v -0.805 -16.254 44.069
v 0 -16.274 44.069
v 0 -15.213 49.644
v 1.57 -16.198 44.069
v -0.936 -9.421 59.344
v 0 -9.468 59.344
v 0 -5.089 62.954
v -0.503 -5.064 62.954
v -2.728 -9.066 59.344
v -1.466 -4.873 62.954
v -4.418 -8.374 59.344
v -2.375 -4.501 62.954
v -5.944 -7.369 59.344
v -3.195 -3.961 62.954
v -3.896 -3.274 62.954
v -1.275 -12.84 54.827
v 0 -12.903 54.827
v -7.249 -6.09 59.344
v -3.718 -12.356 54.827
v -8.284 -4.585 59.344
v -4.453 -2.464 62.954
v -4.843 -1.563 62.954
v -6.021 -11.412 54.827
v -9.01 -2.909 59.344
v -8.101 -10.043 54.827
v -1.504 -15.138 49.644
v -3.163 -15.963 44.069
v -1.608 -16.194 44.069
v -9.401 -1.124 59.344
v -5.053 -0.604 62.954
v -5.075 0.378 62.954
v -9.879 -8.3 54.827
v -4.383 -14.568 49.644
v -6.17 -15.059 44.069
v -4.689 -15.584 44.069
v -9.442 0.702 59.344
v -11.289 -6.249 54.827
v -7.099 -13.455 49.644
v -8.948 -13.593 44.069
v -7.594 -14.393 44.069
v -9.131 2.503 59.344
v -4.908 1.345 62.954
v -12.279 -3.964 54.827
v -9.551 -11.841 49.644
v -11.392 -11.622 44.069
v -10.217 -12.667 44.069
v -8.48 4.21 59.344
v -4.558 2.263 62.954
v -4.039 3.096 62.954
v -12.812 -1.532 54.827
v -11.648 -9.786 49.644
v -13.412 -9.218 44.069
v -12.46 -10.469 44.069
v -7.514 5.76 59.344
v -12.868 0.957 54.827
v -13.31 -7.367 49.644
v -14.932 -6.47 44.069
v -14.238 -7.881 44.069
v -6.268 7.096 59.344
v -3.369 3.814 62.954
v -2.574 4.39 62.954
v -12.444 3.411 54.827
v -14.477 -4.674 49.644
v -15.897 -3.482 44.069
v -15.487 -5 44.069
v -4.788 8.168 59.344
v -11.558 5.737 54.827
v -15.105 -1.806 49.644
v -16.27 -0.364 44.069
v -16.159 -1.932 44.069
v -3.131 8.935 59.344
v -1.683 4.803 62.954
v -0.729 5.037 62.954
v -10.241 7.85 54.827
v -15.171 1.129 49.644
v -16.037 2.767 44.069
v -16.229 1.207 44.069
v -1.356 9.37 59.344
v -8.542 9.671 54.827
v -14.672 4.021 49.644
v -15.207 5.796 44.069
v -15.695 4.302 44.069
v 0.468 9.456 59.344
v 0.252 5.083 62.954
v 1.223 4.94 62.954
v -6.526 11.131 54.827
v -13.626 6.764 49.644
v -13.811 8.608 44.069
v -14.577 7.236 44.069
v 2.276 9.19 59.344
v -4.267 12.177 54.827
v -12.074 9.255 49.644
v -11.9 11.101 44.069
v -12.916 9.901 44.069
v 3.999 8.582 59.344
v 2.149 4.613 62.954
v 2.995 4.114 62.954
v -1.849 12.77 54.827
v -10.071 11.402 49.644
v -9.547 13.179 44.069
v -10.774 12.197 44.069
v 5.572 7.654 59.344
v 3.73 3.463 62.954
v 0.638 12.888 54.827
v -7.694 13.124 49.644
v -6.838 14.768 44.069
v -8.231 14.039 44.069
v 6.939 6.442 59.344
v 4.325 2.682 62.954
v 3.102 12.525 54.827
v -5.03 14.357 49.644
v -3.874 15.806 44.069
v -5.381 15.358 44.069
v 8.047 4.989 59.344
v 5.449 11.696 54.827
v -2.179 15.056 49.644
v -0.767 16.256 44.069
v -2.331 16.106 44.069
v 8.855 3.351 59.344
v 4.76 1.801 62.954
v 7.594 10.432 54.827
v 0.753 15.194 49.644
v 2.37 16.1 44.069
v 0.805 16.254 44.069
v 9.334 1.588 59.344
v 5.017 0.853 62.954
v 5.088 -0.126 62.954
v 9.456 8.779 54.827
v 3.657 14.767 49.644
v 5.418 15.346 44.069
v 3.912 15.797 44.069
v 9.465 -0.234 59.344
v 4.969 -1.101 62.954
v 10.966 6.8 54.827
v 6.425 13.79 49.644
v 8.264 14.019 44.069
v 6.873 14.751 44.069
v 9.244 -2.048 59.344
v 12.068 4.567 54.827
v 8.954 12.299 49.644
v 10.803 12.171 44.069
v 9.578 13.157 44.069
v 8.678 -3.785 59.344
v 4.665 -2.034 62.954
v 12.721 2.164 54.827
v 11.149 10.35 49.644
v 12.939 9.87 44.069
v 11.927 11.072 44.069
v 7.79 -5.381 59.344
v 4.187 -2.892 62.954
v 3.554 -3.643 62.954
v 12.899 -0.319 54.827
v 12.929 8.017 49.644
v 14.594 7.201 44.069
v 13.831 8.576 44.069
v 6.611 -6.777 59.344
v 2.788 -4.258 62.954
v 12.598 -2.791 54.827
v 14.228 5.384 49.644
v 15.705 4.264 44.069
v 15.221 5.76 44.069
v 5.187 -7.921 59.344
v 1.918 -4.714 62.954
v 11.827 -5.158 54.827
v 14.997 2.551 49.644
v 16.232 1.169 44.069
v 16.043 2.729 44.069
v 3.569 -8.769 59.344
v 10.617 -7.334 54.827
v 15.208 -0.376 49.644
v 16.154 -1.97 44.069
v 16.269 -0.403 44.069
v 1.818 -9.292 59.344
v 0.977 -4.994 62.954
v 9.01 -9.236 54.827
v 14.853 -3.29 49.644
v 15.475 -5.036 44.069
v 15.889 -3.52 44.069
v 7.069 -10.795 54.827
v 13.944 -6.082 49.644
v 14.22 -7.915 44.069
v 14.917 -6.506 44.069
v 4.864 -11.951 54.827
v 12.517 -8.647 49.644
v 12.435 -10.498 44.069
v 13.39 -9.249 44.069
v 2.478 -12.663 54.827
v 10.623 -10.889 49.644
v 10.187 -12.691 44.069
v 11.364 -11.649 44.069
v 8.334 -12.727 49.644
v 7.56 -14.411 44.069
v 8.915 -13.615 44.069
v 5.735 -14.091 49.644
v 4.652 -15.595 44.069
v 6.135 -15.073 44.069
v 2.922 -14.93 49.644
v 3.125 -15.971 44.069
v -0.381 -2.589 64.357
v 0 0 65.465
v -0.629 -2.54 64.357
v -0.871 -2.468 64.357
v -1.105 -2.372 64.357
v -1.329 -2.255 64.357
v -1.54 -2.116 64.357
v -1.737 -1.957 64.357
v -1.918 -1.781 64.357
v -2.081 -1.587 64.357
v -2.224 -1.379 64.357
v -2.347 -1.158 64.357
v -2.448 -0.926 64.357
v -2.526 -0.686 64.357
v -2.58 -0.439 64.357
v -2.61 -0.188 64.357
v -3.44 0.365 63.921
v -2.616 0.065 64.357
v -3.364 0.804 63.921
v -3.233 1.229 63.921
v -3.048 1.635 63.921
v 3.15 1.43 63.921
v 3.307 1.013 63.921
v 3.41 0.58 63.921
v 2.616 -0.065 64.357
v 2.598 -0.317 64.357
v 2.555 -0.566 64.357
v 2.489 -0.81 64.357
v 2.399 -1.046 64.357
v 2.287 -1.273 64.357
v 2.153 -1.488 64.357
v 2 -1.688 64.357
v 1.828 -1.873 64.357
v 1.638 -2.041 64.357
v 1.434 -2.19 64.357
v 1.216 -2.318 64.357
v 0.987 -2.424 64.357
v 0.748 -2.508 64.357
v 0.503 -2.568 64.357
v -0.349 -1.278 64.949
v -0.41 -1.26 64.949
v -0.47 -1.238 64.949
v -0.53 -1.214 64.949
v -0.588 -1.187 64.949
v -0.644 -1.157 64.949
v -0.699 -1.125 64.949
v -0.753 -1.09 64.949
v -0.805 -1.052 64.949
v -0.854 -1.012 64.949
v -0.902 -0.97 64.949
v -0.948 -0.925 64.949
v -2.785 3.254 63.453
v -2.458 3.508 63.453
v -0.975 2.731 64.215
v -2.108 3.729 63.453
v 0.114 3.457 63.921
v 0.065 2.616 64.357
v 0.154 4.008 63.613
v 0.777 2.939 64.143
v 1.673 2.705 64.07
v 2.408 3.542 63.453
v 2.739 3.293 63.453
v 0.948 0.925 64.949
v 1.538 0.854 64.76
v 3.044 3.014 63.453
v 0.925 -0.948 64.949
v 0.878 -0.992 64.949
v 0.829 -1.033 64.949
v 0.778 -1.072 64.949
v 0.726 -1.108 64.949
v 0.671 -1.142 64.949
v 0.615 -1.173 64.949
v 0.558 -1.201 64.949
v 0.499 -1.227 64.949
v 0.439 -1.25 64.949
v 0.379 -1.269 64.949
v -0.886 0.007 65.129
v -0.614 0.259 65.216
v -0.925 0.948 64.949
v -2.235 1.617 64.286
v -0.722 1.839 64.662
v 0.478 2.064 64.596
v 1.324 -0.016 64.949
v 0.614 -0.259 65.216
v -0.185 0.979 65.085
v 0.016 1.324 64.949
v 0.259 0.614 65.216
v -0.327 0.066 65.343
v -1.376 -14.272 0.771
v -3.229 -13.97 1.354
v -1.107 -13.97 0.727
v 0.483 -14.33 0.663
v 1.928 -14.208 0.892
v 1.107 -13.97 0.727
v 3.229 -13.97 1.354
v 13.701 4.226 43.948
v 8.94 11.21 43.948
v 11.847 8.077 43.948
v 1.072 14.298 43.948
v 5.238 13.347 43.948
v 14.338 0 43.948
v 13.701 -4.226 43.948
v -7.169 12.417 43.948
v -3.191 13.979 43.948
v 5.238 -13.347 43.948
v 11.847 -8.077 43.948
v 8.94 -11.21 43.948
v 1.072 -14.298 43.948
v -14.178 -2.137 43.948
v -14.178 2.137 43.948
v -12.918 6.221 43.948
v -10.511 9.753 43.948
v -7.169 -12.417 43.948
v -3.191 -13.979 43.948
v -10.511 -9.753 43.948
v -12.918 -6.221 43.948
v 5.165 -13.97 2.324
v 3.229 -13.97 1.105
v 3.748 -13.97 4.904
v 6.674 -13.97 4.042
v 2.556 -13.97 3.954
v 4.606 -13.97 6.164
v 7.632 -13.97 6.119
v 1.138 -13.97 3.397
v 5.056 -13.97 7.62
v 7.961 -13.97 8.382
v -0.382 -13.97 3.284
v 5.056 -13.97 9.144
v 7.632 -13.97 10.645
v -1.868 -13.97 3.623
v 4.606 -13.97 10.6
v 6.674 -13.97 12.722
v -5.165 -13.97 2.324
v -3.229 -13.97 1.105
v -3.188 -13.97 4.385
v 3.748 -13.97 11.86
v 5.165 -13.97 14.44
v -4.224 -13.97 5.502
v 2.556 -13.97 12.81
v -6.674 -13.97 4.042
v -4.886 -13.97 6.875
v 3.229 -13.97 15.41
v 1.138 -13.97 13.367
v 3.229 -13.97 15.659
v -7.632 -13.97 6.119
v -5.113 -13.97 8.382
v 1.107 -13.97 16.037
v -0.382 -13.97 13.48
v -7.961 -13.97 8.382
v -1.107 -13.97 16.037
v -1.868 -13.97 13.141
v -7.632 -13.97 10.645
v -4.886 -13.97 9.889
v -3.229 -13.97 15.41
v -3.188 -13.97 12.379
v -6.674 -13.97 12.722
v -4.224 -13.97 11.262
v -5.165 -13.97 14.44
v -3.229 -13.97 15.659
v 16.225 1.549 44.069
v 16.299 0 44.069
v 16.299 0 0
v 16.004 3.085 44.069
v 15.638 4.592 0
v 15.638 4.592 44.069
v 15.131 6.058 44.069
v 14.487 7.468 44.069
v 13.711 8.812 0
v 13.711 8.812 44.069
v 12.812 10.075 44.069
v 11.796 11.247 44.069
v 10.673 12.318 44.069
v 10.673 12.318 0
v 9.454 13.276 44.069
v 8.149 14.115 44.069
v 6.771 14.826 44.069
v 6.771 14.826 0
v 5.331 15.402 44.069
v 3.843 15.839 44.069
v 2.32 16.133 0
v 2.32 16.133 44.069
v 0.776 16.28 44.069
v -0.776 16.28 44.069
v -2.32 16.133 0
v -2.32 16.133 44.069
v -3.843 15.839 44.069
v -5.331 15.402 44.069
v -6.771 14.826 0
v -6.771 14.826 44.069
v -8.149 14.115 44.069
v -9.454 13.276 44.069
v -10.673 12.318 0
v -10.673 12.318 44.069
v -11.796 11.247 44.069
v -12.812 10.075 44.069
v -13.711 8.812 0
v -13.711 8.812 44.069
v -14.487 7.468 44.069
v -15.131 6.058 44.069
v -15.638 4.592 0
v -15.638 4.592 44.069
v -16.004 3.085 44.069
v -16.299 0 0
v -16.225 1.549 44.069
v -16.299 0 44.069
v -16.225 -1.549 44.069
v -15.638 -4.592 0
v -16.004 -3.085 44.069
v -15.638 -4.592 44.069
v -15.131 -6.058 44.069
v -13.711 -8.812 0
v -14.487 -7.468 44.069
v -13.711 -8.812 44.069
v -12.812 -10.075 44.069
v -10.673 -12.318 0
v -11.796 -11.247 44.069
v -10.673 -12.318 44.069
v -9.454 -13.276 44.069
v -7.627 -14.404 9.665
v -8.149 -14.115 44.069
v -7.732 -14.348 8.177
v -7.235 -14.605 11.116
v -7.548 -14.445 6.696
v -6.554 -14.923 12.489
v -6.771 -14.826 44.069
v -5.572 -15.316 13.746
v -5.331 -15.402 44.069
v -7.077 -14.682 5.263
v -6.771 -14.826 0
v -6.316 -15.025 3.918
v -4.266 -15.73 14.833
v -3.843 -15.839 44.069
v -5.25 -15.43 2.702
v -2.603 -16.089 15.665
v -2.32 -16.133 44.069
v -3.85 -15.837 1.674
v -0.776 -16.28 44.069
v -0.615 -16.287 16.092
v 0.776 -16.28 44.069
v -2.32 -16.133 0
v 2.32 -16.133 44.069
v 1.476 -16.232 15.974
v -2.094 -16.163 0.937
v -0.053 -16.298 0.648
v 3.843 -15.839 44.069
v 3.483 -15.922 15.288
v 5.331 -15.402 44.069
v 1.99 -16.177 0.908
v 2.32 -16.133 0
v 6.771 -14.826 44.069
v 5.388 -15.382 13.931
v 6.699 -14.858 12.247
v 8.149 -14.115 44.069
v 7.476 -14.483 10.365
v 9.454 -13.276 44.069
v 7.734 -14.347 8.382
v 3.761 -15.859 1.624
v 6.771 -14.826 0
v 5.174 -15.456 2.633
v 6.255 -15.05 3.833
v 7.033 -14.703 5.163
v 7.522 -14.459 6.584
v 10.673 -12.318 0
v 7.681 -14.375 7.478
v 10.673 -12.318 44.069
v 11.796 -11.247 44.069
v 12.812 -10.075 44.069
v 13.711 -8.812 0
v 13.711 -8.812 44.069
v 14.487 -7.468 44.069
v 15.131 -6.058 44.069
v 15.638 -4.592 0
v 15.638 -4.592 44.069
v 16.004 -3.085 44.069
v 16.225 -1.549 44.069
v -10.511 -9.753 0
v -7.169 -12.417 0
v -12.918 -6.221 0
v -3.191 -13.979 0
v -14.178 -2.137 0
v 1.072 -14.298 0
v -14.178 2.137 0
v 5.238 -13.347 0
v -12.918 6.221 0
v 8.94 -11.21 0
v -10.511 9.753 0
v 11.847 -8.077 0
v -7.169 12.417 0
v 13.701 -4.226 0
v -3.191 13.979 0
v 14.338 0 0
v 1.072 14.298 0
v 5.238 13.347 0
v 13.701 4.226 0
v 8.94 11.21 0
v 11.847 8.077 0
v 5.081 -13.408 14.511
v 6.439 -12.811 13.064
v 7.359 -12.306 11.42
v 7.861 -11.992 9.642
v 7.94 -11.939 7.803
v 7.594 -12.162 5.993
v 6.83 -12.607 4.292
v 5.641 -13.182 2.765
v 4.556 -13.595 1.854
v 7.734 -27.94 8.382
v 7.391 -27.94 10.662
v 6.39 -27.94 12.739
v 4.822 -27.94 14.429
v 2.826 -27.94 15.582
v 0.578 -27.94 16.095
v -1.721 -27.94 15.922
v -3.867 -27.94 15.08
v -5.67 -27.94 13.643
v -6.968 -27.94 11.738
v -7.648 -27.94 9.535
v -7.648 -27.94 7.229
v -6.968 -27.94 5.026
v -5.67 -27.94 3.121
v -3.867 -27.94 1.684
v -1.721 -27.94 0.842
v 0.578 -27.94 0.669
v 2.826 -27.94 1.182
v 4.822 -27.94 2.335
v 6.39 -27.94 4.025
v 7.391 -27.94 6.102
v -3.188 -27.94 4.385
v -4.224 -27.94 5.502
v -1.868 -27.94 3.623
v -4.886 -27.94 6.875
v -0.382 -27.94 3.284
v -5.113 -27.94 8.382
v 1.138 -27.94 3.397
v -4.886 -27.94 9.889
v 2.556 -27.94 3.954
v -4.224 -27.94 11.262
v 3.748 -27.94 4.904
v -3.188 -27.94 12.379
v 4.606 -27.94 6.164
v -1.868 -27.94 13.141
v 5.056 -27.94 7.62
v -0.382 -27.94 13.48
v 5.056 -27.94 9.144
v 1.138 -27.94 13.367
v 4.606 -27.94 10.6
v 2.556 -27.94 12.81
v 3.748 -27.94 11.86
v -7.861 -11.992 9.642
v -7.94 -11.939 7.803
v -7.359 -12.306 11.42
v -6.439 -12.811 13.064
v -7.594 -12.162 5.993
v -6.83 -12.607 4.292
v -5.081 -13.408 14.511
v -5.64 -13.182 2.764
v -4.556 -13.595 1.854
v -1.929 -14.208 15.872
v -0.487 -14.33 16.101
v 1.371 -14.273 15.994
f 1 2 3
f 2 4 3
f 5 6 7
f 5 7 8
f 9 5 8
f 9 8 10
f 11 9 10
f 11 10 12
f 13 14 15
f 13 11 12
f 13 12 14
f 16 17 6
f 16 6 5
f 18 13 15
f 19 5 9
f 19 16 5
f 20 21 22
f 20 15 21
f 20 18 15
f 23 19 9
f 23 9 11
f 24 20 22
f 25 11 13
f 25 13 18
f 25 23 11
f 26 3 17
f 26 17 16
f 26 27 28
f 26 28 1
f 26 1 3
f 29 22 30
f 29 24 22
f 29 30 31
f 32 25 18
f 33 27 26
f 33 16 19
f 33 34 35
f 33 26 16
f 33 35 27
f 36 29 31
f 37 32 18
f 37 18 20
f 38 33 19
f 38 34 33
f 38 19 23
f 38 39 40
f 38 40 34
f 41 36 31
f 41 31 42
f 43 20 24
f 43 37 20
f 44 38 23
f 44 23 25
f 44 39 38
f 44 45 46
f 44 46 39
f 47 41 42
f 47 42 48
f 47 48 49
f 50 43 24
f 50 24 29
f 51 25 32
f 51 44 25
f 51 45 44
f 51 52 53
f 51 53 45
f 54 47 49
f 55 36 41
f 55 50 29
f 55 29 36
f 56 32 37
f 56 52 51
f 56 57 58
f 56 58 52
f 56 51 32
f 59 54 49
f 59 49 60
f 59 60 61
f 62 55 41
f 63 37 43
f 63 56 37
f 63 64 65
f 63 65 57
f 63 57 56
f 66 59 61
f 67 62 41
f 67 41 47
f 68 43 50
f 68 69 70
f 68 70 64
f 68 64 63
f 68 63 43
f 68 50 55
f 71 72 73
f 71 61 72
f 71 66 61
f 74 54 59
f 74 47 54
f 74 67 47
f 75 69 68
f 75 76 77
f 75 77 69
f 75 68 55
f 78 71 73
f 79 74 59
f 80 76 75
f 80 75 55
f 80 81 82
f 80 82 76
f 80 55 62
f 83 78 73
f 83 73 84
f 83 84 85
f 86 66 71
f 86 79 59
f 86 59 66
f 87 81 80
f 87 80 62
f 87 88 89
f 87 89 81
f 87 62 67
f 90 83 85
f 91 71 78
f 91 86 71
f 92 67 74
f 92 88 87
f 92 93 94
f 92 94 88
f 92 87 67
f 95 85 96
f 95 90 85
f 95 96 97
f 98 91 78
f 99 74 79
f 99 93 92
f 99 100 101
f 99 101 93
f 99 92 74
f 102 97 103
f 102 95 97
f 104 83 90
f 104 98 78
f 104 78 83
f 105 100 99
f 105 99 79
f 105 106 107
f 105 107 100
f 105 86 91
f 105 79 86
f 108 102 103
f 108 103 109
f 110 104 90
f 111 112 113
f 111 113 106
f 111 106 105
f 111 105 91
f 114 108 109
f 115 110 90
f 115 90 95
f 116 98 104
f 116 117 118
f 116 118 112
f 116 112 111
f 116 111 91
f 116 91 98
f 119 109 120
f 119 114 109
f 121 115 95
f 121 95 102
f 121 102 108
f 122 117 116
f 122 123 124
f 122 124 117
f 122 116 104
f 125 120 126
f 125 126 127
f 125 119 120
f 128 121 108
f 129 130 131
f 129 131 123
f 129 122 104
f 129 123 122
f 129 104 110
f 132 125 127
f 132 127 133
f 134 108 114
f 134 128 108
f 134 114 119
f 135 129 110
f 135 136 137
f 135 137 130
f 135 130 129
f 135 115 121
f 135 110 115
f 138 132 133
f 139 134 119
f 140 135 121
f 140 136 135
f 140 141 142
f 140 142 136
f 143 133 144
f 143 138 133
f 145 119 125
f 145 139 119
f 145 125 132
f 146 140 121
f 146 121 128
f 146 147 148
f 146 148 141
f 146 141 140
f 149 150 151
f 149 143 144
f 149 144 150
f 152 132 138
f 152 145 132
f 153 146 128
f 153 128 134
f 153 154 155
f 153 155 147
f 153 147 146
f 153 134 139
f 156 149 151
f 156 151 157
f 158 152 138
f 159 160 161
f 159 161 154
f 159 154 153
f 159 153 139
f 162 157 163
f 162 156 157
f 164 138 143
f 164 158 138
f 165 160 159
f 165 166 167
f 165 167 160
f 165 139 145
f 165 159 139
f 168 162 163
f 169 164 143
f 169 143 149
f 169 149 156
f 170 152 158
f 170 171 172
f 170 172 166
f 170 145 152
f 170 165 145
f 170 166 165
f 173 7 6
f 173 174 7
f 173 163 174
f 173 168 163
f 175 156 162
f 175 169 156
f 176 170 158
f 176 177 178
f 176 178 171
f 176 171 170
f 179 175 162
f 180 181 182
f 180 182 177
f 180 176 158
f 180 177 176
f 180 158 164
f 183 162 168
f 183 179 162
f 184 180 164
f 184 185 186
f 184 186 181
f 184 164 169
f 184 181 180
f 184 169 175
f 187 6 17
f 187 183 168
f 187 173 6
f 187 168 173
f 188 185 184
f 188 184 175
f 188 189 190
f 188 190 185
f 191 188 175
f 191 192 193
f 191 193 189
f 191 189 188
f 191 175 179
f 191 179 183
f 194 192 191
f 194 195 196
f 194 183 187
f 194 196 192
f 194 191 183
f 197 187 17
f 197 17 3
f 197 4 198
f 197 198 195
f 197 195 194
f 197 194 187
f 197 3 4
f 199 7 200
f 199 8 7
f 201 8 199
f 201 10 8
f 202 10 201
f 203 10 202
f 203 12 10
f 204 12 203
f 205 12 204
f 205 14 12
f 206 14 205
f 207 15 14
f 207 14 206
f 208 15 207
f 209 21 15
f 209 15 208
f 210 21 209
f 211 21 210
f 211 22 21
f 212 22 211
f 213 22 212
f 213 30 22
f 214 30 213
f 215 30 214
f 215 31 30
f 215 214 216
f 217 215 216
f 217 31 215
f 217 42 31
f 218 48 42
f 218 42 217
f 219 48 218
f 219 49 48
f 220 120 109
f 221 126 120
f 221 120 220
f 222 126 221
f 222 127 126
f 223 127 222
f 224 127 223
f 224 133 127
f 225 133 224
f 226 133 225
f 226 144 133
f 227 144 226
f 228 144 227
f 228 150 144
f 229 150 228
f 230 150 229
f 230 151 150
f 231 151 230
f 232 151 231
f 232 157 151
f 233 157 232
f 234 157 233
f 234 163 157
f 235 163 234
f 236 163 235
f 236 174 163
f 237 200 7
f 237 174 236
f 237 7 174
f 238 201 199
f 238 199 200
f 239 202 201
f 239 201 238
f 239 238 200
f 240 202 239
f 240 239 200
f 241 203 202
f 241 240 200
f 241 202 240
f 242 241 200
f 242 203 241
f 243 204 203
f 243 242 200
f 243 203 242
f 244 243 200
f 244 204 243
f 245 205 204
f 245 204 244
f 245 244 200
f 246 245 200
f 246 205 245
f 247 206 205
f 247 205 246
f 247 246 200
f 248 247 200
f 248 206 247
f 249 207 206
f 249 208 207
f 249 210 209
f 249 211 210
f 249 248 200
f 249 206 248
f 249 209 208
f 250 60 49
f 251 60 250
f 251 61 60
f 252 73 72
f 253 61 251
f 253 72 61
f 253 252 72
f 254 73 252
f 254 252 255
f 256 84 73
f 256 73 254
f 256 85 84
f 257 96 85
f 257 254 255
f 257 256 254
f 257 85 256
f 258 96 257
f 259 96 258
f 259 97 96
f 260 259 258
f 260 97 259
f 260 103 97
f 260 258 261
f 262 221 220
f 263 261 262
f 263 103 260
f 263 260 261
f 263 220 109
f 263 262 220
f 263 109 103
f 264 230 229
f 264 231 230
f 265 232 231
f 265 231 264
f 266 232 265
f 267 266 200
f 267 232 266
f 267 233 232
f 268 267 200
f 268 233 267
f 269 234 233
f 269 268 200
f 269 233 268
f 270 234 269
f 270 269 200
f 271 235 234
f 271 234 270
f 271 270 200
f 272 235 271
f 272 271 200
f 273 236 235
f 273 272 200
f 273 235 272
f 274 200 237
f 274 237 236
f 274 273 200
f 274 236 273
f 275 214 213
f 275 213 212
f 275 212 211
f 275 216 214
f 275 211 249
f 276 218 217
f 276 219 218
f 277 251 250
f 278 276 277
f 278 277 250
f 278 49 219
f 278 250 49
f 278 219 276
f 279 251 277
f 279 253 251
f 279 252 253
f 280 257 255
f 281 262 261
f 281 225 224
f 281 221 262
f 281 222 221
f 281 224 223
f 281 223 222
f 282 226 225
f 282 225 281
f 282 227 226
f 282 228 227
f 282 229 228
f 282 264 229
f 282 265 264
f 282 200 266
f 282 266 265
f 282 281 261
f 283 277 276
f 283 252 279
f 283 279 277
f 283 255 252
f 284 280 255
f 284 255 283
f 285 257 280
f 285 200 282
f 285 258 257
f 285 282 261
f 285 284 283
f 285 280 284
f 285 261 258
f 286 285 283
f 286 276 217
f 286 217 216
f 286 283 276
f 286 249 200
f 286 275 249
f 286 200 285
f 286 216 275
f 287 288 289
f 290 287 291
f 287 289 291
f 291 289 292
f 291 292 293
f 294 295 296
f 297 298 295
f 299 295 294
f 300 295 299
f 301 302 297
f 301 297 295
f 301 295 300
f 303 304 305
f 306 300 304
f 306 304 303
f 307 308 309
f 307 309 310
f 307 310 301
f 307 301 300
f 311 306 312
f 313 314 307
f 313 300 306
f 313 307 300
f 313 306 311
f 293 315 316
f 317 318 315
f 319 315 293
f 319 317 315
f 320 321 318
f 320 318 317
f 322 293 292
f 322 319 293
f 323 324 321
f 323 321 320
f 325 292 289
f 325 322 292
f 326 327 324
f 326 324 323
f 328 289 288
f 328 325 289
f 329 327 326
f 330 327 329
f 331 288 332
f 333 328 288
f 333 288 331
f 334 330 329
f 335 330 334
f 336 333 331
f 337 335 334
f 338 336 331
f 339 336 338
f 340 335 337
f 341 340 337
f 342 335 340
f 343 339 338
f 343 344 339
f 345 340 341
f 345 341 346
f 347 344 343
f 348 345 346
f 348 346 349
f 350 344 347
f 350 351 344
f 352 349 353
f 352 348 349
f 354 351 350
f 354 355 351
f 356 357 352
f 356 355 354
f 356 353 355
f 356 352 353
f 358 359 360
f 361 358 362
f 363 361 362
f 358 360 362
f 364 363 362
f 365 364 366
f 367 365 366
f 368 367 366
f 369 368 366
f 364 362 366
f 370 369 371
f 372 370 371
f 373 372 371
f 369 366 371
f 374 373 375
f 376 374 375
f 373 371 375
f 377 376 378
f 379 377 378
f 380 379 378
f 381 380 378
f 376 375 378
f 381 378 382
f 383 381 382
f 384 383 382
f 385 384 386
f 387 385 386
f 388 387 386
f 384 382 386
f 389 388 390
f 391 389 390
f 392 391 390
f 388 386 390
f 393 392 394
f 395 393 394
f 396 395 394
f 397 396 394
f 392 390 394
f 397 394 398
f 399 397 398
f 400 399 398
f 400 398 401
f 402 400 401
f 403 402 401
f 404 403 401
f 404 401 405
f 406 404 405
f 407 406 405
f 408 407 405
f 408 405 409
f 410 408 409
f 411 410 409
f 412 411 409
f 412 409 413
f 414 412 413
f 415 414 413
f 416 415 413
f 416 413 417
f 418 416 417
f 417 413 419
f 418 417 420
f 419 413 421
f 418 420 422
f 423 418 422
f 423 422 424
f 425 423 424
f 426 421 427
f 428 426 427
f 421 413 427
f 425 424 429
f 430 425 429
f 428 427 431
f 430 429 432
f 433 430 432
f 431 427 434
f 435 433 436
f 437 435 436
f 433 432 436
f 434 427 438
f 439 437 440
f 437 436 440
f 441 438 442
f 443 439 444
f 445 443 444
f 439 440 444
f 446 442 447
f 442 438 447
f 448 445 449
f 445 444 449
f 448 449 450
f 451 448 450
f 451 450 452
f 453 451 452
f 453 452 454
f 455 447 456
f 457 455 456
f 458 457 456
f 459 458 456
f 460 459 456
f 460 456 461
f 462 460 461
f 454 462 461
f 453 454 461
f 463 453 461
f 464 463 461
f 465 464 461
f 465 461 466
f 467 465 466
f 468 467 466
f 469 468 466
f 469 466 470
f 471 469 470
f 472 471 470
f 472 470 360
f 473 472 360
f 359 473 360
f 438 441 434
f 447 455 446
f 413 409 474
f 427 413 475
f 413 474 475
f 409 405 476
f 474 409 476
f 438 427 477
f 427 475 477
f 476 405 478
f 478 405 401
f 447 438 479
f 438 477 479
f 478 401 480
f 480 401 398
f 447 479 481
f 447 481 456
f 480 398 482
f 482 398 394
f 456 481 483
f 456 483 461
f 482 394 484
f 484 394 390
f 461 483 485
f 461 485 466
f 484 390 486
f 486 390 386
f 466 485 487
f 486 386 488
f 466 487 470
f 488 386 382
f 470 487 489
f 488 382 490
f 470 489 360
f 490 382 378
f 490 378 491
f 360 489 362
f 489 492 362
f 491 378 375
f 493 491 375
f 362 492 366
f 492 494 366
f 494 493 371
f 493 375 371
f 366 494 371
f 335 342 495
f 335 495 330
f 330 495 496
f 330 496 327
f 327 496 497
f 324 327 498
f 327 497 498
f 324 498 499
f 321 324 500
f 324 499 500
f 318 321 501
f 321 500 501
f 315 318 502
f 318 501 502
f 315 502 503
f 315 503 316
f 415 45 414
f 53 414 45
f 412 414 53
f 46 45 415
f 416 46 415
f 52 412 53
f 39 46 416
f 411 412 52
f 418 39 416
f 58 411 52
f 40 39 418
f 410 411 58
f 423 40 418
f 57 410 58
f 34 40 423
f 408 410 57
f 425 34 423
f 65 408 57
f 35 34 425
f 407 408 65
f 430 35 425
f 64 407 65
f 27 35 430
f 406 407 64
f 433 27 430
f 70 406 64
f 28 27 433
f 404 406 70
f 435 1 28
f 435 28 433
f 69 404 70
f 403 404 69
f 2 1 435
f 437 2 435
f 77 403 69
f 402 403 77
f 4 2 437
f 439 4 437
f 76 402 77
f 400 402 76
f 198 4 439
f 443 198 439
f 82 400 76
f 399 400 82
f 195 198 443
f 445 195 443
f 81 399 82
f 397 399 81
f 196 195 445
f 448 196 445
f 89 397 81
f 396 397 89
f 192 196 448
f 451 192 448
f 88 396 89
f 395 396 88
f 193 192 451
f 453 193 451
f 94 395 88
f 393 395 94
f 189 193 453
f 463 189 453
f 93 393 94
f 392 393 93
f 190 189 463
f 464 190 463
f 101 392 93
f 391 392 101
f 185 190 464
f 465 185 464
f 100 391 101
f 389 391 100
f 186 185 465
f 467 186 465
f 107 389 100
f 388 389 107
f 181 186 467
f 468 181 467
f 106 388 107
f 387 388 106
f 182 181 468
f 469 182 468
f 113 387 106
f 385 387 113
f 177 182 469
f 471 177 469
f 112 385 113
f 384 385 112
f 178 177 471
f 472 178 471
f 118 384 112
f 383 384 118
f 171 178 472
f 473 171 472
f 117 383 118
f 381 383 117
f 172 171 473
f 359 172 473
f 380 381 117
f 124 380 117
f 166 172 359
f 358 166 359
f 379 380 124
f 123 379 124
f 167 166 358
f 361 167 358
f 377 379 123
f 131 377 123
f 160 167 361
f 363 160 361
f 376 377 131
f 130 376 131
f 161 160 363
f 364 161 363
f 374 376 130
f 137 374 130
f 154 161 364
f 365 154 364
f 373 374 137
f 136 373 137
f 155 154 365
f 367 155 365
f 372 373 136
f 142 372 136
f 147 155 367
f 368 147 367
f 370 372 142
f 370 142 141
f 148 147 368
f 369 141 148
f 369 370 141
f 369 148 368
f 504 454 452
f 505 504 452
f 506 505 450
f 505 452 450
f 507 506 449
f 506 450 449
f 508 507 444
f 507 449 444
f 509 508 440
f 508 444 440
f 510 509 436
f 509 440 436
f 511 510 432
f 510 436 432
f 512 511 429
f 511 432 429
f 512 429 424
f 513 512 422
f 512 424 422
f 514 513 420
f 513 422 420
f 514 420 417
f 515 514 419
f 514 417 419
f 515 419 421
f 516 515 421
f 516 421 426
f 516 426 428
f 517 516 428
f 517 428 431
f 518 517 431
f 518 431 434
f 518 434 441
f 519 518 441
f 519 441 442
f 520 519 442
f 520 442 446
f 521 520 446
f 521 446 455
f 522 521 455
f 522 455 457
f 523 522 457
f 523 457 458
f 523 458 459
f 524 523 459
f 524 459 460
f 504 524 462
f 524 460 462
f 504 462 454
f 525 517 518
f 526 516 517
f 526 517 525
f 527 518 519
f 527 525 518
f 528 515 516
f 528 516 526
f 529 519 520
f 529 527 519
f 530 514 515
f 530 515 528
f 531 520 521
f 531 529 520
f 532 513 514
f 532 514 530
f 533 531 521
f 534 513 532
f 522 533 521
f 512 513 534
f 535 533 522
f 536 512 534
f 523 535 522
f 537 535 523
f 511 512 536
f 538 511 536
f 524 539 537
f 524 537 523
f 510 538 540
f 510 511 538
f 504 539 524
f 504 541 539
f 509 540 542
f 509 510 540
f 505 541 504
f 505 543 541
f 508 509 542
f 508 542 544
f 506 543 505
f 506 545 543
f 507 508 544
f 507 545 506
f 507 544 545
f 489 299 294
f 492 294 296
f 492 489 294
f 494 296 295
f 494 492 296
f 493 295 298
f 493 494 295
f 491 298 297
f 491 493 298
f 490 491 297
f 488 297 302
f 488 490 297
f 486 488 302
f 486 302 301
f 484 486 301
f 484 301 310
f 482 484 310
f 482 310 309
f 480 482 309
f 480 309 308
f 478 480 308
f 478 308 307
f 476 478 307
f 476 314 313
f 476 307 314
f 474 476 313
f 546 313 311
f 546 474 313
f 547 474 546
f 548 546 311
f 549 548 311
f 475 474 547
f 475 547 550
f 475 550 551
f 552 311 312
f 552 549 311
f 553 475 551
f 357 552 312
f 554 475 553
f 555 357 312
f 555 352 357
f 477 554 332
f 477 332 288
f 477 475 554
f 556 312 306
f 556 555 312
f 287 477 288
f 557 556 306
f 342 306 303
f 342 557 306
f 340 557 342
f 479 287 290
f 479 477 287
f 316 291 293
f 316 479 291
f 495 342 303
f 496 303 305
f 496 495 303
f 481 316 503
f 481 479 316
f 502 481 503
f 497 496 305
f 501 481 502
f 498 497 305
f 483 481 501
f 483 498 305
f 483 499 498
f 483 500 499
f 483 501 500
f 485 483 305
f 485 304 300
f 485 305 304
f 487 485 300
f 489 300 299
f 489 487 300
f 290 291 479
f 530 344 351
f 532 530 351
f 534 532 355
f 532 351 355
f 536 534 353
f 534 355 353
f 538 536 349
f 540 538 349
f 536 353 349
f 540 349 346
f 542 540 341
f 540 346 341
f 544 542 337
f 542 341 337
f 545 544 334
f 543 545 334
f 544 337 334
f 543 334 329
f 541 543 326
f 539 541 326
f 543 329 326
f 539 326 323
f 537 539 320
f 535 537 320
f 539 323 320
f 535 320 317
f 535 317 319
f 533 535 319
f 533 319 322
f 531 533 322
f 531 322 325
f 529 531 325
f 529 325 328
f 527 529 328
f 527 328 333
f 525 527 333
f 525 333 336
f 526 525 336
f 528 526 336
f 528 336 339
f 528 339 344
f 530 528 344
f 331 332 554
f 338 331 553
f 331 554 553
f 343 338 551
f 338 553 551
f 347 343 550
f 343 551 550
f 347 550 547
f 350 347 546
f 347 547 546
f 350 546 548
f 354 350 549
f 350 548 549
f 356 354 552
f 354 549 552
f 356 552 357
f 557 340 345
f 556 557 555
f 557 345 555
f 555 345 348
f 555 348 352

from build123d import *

# Parameters (mm, degrees)
F0_R     = 16.298534
F0_R_2   = 14.3383
F1_DEPTH = 44.069
F2_R     = 7.7343
F3_DEPTH = 27.94
F4_R     = 7.960933
F5_DEPTH = 13.97
F6_R     = 5.11277
F7_DEPTH = 25.4


with BuildPart() as f1:
    # F0 (on Top) → F1 (new body)
    with BuildSketch(Plane.XY):
        Circle(F0_R)
        Circle(F0_R_2, mode=Mode.SUBTRACT)
    extrude(amount=F1_DEPTH)

    # F2 (on Front) → F3 (join)
    with BuildSketch(Plane.XZ):
        with Locations((0, 8.382)):
            Circle(F2_R)
    extrude(amount=F3_DEPTH)

    # F4 (on face) → F5 (cut)
    with BuildSketch(Plane(origin=(0, 0, 0), x_dir=(-1, 0, 0), z_dir=(0, 1, 0))):
        with Locations((0, 8.382)):
            Circle(F4_R)
    extrude(amount=-F5_DEPTH, mode=Mode.SUBTRACT)

    # F6 (on face) → F7 (cut)
    with BuildSketch(Plane(origin=(0, -13.97, 0), x_dir=(-1, 0, 0), z_dir=(0, 1, 0))):
        with Locations((0, 8.382)):
            Circle(F6_R)
    extrude(amount=-F7_DEPTH, mode=Mode.SUBTRACT)

    # F8 (on Right) → F9 (revolve)
    with BuildSketch(Plane.YZ):
        with BuildLine():
            Line((-16.282385, 43.947611), (0, 43.947611))
            Line((0, 43.947611), (0, 65.465011))
            ThreePointArc((0, 65.465011), (-11.352979, 57.136695), (-16.282385, 43.947611))
        make_face()
    revolve(axis=Axis((0, 0, 54.706311), (0, 0, -1)))


solid = f1.part
